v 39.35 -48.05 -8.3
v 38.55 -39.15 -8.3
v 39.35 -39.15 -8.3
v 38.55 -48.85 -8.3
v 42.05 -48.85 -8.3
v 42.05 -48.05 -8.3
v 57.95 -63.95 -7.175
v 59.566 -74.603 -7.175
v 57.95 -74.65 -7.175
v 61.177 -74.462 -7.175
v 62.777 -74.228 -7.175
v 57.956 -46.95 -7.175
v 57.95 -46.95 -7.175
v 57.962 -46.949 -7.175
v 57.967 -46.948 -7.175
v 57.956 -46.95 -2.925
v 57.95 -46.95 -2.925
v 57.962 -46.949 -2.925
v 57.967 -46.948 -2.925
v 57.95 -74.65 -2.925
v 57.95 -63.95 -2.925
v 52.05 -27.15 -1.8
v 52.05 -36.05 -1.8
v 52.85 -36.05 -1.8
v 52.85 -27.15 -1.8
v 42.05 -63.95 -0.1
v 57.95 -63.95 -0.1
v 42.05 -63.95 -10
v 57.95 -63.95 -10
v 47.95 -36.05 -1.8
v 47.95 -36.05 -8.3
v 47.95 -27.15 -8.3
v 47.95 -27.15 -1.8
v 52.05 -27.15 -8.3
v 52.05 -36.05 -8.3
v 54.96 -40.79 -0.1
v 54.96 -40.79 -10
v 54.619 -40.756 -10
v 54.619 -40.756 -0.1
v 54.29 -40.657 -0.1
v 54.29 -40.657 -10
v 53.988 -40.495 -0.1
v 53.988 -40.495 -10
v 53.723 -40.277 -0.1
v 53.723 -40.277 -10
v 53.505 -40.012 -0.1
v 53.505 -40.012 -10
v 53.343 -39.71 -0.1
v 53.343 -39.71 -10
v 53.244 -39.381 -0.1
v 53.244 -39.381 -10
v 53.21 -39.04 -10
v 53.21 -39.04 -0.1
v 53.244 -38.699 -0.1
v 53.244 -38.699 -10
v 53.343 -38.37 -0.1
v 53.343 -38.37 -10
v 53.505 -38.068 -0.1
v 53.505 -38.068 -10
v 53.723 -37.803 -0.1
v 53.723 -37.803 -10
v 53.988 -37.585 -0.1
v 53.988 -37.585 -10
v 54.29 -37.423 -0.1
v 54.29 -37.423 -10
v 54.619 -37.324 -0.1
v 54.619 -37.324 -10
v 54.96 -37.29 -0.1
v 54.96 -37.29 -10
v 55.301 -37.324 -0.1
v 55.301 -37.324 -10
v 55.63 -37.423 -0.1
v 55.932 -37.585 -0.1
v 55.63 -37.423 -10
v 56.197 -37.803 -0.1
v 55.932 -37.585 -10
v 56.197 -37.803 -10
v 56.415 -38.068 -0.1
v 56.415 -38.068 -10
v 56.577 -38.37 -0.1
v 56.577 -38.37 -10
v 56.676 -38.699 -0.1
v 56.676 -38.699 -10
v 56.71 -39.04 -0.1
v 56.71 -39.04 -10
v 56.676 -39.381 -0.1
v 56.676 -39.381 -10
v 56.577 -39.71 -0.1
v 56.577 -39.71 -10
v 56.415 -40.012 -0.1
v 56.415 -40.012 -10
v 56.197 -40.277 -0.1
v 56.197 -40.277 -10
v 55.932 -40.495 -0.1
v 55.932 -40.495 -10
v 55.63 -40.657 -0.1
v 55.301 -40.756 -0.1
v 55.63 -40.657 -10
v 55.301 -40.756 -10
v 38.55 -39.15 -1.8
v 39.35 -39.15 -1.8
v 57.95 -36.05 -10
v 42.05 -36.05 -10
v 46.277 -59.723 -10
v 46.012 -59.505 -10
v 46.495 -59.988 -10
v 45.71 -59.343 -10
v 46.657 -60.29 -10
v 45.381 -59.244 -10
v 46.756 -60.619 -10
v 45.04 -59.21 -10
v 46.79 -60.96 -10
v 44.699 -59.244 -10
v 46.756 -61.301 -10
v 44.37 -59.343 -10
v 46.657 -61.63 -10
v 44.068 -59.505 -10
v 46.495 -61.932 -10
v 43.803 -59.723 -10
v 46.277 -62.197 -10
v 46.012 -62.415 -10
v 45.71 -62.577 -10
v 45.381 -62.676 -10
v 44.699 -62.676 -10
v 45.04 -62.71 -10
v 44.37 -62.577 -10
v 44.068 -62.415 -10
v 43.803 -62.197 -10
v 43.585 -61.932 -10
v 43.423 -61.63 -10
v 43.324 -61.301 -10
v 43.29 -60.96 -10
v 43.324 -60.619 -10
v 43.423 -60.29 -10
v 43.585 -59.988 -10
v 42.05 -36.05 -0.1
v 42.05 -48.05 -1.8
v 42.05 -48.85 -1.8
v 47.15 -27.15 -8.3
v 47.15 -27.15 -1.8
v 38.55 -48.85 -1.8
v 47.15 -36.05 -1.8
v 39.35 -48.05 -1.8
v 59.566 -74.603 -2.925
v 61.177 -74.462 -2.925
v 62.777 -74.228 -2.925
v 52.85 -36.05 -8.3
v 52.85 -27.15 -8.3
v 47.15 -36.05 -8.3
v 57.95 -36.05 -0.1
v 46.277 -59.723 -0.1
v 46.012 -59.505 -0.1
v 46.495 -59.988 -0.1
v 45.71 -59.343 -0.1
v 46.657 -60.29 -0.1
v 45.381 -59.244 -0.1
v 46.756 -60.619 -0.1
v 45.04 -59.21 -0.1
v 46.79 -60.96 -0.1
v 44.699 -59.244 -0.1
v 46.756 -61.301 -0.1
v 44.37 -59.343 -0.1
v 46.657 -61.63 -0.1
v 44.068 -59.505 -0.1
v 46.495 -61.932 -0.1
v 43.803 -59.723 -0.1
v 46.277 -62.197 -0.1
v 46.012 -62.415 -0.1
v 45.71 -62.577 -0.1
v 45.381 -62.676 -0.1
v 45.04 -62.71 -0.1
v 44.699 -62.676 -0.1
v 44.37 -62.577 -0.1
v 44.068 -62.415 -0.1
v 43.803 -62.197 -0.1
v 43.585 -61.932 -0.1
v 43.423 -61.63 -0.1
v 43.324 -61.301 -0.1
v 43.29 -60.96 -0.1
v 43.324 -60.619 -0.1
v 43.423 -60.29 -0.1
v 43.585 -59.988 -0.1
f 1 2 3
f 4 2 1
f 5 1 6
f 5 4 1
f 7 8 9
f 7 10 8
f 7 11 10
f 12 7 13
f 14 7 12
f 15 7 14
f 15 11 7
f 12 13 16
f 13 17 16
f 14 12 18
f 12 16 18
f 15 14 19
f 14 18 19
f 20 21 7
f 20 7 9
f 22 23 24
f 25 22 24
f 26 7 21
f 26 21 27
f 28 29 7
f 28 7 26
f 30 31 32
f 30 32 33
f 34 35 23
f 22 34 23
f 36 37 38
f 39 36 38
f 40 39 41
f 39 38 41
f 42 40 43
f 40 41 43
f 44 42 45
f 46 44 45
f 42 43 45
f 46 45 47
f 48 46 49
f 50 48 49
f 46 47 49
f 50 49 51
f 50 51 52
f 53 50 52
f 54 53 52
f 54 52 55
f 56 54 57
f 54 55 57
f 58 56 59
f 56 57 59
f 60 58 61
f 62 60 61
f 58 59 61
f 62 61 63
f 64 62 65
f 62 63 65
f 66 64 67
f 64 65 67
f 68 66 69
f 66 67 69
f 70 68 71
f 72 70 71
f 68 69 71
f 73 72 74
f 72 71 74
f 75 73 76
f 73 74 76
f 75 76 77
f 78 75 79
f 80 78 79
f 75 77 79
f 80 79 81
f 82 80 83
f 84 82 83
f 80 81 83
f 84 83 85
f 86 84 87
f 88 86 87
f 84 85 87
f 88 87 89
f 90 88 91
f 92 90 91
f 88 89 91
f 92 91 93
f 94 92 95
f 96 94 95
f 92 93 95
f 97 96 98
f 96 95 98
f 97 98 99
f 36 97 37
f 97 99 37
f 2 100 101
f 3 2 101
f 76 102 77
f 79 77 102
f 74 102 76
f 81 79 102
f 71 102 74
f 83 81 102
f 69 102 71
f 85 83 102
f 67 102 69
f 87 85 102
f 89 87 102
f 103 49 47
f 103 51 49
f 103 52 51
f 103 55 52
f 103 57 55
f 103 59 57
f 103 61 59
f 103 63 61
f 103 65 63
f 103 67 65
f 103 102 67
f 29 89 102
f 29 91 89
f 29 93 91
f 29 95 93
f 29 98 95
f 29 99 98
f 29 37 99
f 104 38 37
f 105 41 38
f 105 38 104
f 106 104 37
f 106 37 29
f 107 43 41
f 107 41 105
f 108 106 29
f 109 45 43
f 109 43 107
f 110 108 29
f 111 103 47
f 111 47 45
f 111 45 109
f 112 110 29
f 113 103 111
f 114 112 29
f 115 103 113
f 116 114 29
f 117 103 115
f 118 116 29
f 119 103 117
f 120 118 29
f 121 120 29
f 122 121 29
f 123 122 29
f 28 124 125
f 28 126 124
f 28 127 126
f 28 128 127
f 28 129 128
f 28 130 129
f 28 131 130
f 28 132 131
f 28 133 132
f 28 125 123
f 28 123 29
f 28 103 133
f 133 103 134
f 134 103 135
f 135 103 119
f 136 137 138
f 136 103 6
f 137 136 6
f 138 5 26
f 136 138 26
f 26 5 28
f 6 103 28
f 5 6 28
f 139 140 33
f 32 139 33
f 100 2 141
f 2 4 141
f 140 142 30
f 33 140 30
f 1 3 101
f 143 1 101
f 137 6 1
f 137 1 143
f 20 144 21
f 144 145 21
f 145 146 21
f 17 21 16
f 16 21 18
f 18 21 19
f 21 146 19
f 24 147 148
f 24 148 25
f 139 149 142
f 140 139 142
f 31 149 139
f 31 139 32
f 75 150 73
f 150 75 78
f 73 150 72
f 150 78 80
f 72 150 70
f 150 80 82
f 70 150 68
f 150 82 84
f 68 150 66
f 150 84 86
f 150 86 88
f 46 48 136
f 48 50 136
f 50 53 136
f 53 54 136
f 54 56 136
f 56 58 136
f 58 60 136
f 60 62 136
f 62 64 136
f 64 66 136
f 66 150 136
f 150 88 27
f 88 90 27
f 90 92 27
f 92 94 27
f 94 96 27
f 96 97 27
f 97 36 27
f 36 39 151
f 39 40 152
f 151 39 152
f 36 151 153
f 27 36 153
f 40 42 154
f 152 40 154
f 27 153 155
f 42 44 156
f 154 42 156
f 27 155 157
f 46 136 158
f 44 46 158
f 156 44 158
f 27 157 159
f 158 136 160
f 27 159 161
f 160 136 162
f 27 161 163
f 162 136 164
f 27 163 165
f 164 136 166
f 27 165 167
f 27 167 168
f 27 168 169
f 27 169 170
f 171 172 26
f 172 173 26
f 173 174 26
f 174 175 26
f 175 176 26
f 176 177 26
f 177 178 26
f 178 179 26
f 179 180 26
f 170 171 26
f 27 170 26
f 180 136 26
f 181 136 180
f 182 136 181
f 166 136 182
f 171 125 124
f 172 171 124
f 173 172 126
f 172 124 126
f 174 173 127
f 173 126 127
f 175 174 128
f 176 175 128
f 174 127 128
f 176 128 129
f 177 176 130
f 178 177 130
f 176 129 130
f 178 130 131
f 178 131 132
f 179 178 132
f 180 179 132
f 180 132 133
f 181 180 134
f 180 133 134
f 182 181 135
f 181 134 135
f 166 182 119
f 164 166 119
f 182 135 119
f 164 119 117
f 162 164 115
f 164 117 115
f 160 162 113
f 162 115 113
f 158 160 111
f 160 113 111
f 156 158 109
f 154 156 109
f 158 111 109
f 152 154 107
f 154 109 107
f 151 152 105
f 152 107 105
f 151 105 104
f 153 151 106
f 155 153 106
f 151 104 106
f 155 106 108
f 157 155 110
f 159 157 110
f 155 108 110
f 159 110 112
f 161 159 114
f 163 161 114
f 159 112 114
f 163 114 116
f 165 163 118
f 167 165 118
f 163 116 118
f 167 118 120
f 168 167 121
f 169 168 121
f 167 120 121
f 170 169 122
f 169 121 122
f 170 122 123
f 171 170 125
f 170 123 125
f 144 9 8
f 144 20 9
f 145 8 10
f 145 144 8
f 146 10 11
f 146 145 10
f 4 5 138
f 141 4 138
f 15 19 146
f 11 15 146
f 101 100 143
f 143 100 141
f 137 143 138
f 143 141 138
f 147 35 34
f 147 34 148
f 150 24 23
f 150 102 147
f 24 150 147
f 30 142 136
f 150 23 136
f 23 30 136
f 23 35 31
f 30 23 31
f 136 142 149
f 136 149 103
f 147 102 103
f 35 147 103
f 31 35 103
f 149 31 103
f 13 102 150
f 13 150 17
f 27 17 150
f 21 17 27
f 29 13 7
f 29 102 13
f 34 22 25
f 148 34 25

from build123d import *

# Parameters (mm, degrees)
SKETCH037_W             = 27.9
SKETCH037_H             = 15.9
SKETCH037_R             = 1.75
PAD025_DEPTH            = 9.9
SKETCH038_W             = 27.7
SKETCH038_H             = 4.25
REVOLUTION_ANGLE        = 10
SKETCH039_W             = 0.8
SKETCH039_H             = 6.5
PAD026_DEPTH            = 8.9
SKETCH040_W             = 0.8
SKETCH040_H             = 6.5
PAD027_DEPTH            = 3.5
SKETCH041_W             = 0.8
SKETCH041_H             = 6.5
PAD028_DEPTH            = 8.9
BODY007_PLACEMENT_ANGLE = 90


with BuildPart() as capteurcontact:
    # Sketch037 → Pad025 (new body)
    with BuildSketch(Plane.XY):
        Rectangle(SKETCH037_W, SKETCH037_H)
        with Locations((10.96, 4.96)):
            Circle(SKETCH037_R, mode=Mode.SUBTRACT)
        with Locations((-10.96, -4.96)):
            Circle(SKETCH037_R, mode=Mode.SUBTRACT)
    extrude(amount=PAD025_DEPTH)

    # Sketch038 (on Face3 of Pad025) → Revolution (revolve)
    with BuildSketch(Plane.XZ.offset(7.95)):
        with Locations((10.8, 4.95)):
            Rectangle(SKETCH038_W, SKETCH038_H)
    revolve(axis=Axis((-3.15, -7.95, 7.075), (0, 0, -1)), revolution_arc=REVOLUTION_ANGLE)

    # Sketch039 (on Face2 of Revolution) → Pad026 (join)
    with BuildSketch(Plane(origin=(-13.95, 0, 0), x_dir=(0, -1, 0), z_dir=(-1, 0, 0))):
        with Locations((-2.45, 4.95)):
            Rectangle(SKETCH039_W, SKETCH039_H)
        with Locations((2.45, 4.95)):
            Rectangle(SKETCH039_W, SKETCH039_H)
    extrude(amount=PAD026_DEPTH)

    # Sketch040 (on Face1 of Pad026) → Pad027 (join)
    with BuildSketch(Plane(origin=(0, 7.95, 0), x_dir=(-1, 0, 0), z_dir=(0, 1, 0))):
        with Locations((1.55, 4.95)):
            Rectangle(SKETCH040_W, SKETCH040_H)
    extrude(amount=PAD027_DEPTH)

    # Sketch041 (on Face8 of Pad027) → Pad028 (join)
    with BuildSketch(Plane(origin=(-1.95, 0, 0), x_dir=(0, -1, 0), z_dir=(-1, 0, 0))):
        with Locations((-11.05, 4.95)):
            Rectangle(SKETCH041_W, SKETCH041_H)
    extrude(amount=PAD028_DEPTH)


with BuildPart() as capteurcontact_1:
    # Body007 placement: moved
    add(capteurcontact.part.moved(Location((50, 50, -10))).rotate(Axis((50, 50, -10), (0, 0, 1)), BODY007_PLACEMENT_ANGLE))


with BuildPart() as part_mirroring001:
    # Part__Mirroring001: instance of CapteurContact
    add(capteurcontact_1.part.mirror(Plane(origin=(0, 0, 0), x_dir=(1, 0, 0), z_dir=(0, 1, 0))))


solid = part_mirroring001.part
